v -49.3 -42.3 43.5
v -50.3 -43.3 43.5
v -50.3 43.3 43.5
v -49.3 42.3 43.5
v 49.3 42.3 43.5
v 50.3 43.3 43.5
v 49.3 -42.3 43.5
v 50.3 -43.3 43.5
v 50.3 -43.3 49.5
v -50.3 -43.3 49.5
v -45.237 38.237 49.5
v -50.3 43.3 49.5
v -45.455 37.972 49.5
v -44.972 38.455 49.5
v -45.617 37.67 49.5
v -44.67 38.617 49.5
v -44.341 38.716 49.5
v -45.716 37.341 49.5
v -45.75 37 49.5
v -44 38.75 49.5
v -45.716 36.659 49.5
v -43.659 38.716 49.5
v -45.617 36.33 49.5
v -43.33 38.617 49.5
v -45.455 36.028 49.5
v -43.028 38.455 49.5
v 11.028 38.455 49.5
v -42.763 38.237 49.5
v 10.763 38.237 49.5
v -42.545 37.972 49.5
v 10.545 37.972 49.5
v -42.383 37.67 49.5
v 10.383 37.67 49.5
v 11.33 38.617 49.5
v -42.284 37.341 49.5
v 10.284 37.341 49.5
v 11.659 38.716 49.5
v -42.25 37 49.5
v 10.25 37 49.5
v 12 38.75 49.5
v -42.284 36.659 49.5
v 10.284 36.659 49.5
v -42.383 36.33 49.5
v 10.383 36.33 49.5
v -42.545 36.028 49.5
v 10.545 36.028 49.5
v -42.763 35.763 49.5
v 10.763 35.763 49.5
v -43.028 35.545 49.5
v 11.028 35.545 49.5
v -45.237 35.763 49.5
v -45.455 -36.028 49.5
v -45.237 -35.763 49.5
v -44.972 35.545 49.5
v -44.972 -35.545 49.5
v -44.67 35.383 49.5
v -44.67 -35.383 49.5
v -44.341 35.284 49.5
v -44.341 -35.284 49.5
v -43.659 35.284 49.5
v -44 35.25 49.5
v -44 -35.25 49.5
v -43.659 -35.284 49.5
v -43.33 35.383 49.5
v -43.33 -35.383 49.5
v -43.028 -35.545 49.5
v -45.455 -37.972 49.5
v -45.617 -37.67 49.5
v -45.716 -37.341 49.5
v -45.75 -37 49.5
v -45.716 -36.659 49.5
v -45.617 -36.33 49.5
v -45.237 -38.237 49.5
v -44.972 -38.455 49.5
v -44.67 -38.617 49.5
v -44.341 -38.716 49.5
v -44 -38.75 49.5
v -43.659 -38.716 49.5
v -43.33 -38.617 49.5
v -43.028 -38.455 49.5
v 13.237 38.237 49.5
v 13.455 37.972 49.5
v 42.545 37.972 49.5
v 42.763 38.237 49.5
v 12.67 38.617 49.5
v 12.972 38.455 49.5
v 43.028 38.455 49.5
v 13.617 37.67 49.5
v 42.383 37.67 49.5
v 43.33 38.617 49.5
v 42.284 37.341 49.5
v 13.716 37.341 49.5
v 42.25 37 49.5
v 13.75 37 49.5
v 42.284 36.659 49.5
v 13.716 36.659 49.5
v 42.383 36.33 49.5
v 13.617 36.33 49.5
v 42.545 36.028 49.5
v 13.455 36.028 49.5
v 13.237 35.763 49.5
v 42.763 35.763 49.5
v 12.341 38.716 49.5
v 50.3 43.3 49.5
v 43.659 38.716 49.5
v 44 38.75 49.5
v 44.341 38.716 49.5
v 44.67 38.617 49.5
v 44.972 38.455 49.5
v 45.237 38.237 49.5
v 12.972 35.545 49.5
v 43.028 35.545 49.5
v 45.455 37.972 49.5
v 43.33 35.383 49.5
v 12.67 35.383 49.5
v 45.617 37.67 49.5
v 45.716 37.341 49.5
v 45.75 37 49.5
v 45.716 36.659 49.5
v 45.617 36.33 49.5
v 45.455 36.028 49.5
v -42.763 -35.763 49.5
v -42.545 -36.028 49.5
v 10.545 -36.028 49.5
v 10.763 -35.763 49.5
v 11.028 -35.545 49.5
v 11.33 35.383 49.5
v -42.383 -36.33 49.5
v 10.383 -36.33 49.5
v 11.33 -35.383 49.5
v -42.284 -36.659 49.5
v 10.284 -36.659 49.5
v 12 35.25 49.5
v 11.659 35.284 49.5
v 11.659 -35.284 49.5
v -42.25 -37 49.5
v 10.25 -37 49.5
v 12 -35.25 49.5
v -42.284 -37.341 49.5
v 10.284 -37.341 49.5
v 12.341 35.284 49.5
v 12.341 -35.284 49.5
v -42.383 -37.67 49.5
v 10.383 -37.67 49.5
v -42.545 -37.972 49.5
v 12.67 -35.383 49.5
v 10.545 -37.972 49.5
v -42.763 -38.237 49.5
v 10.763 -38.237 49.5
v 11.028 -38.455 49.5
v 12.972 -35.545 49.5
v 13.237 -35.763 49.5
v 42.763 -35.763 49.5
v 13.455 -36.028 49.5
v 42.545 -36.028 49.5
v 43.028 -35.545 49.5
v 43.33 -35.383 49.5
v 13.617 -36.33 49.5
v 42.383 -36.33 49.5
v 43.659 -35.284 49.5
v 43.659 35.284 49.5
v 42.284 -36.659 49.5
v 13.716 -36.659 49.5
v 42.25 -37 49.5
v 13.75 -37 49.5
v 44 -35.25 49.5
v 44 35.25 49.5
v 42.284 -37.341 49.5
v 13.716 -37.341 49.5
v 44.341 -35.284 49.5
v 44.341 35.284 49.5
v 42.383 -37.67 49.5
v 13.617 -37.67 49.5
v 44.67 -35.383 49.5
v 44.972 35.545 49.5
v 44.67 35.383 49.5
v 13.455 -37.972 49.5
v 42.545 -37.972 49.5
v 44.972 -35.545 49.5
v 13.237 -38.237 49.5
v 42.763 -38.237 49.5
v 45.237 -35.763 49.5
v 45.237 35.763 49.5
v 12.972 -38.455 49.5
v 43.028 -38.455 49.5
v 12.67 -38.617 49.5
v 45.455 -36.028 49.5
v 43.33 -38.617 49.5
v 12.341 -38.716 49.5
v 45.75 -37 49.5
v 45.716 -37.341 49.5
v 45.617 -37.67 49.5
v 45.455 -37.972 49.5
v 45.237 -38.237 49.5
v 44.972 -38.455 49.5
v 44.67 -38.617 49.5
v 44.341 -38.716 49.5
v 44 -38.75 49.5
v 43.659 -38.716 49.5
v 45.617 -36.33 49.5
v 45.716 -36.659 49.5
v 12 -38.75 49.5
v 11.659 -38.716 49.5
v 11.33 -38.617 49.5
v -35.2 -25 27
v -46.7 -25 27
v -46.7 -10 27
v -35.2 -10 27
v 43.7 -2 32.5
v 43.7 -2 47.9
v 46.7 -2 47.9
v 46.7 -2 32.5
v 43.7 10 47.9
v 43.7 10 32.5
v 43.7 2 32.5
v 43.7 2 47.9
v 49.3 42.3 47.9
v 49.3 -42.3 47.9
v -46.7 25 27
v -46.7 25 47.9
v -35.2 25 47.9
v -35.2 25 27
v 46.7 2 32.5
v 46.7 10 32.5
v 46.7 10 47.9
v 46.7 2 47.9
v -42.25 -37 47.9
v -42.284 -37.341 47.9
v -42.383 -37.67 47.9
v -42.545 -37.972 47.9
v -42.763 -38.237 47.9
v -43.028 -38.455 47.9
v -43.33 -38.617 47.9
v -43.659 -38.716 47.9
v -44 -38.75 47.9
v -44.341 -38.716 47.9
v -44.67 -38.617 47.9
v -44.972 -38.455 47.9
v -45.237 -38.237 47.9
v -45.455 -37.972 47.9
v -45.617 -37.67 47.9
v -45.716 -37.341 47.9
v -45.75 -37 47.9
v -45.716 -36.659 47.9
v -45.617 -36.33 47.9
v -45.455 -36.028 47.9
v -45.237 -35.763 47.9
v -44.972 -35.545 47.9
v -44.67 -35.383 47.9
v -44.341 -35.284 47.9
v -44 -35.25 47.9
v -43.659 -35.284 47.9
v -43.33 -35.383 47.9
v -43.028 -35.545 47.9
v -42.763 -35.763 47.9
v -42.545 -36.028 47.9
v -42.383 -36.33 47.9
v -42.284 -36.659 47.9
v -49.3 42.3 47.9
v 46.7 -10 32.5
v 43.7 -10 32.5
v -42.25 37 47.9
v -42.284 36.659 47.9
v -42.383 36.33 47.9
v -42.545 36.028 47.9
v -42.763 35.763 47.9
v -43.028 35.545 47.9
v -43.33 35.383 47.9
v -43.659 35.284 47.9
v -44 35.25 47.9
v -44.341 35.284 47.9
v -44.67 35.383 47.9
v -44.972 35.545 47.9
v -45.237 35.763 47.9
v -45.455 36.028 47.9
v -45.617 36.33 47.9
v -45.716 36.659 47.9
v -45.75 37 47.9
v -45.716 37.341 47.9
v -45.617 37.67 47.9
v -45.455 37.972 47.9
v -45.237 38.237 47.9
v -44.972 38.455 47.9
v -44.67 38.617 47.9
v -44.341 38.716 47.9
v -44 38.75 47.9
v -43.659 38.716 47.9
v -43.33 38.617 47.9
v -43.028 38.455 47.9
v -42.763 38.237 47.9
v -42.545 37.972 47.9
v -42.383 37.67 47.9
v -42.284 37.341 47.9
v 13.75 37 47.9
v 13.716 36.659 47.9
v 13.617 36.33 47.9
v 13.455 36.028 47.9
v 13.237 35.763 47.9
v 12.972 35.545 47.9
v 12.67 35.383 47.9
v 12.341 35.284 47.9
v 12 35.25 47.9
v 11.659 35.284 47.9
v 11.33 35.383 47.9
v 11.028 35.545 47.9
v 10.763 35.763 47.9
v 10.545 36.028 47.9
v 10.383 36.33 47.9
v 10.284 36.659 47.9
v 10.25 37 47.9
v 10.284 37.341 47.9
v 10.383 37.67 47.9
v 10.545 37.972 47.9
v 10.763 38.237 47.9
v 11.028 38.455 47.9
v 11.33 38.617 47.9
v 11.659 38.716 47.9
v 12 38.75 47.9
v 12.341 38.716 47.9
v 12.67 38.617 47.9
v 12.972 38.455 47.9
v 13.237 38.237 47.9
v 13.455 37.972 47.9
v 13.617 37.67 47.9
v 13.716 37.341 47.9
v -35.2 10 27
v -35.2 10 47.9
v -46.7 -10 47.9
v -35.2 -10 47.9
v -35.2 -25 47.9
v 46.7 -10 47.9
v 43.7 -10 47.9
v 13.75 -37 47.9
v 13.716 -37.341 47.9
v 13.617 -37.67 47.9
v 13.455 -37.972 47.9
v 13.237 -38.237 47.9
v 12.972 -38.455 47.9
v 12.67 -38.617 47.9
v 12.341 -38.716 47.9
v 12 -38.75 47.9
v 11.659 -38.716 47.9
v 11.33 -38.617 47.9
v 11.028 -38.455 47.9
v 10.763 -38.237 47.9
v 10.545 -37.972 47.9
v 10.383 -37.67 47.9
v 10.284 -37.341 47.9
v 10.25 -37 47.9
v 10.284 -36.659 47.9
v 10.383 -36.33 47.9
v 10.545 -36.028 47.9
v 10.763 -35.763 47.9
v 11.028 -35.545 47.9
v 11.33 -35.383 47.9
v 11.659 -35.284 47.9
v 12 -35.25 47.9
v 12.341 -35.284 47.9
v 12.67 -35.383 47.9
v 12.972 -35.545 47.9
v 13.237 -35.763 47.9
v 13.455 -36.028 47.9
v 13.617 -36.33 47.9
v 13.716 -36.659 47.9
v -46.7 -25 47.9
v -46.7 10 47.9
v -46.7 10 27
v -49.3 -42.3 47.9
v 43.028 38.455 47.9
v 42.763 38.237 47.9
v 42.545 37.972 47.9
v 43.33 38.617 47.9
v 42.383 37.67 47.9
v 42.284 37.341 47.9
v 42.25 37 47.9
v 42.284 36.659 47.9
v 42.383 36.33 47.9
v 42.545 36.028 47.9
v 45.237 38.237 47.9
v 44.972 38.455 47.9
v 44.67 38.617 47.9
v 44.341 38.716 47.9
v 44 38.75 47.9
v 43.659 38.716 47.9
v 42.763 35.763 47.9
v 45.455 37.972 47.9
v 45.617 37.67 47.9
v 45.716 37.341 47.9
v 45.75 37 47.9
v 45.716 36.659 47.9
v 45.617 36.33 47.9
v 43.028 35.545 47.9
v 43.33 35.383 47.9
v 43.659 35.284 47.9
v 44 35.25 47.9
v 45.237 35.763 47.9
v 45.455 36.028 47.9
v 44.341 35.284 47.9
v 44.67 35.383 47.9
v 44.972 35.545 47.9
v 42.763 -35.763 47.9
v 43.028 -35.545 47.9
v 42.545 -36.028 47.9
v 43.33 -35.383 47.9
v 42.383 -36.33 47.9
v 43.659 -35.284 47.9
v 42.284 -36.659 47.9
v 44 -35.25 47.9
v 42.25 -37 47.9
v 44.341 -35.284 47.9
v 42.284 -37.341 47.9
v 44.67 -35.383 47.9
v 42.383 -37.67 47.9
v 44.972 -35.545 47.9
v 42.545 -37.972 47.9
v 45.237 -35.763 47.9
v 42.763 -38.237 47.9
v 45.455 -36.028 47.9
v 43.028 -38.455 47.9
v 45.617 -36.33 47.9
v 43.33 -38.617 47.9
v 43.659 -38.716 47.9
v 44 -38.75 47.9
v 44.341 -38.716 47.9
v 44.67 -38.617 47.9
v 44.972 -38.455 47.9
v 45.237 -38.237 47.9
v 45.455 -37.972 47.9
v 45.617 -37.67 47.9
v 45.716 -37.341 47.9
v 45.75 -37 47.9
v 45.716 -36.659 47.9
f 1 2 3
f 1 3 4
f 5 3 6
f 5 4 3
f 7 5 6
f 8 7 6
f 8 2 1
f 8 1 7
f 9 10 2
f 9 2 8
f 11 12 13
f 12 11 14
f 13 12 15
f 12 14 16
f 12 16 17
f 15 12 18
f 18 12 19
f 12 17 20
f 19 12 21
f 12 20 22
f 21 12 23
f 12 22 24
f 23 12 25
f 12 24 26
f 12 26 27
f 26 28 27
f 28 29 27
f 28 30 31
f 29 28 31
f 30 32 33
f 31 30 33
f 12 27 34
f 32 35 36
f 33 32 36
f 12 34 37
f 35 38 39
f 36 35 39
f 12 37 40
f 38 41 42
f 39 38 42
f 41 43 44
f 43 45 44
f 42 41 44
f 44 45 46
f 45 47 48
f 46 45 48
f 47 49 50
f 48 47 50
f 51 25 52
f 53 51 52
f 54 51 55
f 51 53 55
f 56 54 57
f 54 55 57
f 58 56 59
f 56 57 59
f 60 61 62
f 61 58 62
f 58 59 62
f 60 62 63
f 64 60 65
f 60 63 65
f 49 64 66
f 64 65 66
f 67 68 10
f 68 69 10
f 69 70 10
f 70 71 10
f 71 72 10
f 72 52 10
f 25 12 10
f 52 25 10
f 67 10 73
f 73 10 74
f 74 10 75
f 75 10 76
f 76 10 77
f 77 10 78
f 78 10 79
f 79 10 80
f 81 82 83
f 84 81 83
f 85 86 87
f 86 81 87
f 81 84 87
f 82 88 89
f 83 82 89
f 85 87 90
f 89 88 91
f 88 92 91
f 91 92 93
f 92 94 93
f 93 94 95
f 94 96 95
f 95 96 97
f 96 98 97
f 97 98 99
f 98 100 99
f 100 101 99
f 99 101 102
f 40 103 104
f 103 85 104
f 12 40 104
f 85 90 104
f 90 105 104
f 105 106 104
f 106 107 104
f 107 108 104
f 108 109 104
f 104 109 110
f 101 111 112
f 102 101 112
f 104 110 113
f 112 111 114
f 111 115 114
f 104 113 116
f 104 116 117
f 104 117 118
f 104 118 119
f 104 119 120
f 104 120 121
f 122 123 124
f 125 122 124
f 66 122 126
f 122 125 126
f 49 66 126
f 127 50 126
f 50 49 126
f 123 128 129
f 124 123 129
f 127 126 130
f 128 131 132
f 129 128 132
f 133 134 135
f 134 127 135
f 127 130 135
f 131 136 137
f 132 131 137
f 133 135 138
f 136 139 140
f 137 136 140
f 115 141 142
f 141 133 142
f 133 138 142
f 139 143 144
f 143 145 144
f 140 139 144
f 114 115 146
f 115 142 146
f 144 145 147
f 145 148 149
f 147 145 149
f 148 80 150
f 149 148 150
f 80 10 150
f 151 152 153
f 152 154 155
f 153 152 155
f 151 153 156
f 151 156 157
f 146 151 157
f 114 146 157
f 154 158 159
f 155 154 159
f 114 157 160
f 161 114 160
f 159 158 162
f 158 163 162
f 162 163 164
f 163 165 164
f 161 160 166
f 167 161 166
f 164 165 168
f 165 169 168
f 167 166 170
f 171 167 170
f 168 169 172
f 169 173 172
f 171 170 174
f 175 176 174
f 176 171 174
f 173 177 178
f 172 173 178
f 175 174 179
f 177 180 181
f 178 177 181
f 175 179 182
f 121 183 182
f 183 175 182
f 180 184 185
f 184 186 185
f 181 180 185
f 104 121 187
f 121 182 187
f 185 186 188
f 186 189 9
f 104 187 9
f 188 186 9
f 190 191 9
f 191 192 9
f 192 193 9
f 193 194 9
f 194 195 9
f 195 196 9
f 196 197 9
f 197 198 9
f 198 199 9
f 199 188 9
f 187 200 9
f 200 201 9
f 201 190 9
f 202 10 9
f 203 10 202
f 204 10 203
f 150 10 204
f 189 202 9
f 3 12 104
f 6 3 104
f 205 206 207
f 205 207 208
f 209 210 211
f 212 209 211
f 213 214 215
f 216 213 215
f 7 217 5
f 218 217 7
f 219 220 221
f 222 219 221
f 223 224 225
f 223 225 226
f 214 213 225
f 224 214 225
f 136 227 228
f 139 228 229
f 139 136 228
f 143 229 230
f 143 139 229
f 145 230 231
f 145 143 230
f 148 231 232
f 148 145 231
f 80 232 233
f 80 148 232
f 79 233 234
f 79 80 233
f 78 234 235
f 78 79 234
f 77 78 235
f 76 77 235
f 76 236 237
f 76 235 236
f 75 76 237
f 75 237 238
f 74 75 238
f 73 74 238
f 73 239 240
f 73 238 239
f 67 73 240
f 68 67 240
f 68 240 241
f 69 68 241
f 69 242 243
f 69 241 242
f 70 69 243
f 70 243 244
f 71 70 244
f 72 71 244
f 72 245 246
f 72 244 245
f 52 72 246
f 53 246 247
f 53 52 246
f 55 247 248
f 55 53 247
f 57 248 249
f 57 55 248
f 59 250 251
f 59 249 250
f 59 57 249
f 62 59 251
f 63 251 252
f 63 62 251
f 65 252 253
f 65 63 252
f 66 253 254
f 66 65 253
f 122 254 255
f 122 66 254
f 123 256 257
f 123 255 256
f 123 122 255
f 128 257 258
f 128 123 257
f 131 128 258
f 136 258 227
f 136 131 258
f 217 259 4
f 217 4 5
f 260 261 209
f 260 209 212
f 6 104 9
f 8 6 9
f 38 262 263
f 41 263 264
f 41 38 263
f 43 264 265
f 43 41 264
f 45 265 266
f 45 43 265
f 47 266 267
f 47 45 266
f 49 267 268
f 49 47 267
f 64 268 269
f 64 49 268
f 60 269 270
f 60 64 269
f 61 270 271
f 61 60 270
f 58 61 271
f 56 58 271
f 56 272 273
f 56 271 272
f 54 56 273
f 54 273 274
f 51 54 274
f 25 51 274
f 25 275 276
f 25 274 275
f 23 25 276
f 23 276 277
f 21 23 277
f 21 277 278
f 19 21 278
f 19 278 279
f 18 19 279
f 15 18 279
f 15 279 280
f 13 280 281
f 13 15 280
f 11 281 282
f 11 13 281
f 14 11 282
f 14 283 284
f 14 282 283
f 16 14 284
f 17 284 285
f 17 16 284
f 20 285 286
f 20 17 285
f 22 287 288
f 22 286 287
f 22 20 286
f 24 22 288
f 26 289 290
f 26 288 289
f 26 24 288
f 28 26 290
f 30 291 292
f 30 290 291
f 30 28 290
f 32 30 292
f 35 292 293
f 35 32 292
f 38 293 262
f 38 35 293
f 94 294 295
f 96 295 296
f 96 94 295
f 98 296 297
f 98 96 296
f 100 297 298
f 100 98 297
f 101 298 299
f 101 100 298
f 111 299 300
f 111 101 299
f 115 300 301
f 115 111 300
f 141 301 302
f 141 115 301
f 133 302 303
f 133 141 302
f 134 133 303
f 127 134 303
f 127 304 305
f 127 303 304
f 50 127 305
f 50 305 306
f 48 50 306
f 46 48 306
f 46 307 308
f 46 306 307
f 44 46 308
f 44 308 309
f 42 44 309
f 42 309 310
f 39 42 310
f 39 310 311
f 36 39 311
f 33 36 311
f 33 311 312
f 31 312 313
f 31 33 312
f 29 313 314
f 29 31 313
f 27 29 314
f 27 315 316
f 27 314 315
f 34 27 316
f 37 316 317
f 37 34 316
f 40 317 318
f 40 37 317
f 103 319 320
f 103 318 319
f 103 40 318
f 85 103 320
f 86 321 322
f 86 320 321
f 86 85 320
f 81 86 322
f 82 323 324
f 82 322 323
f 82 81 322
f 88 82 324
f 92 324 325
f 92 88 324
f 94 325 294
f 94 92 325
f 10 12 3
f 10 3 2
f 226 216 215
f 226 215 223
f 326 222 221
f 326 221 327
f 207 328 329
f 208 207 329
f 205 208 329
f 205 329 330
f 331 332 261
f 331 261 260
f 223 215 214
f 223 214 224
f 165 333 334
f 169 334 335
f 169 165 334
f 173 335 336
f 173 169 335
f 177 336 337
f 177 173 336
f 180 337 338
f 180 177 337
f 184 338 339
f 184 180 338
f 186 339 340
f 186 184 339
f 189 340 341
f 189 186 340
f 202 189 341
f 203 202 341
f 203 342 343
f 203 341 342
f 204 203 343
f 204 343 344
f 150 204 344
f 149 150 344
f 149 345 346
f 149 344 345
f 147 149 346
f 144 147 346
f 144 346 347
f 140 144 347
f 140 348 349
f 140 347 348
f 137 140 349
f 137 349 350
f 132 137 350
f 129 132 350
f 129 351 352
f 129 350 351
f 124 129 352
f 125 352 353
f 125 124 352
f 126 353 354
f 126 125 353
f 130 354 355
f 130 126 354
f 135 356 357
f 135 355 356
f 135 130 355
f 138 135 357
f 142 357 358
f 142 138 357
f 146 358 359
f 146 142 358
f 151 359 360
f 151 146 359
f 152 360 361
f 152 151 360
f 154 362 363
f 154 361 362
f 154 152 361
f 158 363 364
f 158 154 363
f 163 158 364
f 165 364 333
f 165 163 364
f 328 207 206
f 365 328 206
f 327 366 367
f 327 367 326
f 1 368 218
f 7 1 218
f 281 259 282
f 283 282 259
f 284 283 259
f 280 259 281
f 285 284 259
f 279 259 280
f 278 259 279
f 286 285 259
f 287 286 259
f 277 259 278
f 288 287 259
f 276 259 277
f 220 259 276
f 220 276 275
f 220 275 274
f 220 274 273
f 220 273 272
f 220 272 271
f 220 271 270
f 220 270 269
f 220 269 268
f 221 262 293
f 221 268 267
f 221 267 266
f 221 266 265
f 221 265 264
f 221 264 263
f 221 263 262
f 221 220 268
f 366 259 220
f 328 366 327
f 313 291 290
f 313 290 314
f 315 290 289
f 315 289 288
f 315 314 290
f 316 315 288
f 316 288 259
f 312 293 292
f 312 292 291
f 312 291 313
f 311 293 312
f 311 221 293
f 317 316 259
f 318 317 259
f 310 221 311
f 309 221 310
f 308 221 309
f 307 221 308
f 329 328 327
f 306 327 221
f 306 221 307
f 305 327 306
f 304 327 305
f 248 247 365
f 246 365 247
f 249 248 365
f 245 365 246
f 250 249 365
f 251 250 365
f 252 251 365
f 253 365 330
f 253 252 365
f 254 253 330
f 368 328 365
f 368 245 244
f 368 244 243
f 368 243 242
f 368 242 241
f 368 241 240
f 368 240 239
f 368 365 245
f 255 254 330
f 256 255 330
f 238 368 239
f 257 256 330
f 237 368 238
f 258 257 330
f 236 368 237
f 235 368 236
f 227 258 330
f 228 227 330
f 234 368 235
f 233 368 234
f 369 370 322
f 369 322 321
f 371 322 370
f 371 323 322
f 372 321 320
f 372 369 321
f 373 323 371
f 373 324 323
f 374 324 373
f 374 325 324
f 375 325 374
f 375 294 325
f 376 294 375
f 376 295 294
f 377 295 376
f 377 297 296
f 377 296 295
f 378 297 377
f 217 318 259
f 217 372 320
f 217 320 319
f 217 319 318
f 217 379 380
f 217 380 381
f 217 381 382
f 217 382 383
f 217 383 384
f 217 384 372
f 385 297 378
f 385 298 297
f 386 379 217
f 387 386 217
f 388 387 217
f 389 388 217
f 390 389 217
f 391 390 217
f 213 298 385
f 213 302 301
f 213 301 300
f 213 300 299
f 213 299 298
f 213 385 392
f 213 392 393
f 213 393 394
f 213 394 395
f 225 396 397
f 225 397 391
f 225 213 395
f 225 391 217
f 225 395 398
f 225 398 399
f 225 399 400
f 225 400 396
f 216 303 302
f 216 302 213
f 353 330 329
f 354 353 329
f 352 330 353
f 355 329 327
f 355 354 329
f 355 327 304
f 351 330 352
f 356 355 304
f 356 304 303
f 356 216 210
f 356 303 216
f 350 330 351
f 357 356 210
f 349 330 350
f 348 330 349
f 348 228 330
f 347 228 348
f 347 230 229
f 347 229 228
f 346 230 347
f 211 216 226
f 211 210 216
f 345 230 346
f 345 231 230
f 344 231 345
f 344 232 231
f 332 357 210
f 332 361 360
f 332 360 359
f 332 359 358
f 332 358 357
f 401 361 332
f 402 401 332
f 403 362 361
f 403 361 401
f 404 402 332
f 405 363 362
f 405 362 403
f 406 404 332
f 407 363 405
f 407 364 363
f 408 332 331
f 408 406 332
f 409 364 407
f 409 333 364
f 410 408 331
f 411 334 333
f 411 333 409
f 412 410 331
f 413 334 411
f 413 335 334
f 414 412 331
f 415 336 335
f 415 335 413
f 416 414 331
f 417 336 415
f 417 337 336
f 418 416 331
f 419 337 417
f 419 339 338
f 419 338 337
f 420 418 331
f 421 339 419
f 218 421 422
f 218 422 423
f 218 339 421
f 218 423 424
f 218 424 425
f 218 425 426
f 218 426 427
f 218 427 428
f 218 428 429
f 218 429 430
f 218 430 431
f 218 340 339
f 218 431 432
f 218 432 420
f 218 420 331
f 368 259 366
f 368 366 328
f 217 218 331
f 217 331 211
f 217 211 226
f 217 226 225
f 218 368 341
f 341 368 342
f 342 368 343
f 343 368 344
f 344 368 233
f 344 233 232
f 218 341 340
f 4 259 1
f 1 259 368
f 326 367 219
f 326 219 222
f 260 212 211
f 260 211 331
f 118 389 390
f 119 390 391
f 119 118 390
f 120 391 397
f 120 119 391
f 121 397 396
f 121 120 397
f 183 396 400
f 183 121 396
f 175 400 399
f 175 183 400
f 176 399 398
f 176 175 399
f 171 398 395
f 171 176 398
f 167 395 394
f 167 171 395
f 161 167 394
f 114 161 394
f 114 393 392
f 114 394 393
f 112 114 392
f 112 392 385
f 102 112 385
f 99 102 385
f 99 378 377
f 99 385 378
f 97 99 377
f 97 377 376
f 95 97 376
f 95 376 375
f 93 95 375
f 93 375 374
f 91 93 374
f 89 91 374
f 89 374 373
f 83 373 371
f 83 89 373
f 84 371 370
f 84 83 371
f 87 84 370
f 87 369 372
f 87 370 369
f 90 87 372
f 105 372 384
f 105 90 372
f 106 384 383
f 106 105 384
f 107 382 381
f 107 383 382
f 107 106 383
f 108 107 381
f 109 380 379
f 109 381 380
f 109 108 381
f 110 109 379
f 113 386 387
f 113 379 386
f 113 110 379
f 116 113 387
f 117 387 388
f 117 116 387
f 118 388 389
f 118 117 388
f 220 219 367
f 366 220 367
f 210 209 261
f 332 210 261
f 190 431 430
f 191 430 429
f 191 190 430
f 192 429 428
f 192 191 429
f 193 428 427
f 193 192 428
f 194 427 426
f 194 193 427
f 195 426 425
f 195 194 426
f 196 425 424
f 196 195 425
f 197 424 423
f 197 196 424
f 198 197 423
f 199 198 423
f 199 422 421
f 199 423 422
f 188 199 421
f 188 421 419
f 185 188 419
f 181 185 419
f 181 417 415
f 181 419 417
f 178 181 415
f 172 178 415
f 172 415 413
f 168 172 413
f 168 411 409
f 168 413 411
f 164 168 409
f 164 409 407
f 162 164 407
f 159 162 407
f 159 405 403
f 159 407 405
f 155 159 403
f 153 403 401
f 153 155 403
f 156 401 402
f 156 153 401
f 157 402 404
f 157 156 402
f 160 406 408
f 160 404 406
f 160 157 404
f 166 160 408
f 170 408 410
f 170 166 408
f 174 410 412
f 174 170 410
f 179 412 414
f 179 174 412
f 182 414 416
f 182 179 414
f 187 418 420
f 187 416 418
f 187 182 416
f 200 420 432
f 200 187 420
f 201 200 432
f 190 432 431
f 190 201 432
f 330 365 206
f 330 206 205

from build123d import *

# Parameters (mm, degrees)
SKETCH031_W             = 98.6
SKETCH031_H             = 84.6
PAD021_DEPTH            = 1.6
SKETCH032_W             = 100.6
SKETCH032_H             = 86.6
SKETCH032_W_2           = 98.6
SKETCH032_H_2           = 84.6
PAD022_DEPTH            = 6
SKETCH034_W             = 11.5
SKETCH034_H             = 15
PAD023_DEPTH            = 22.5
SKETCH035_W             = 3
SKETCH035_H             = 8
PAD024_DEPTH            = 17
SKETCH033_R             = 1.75
POCKET010_DEPTH         = 5
BODY007_PLACEMENT_ANGLE = 180


with BuildPart() as part:
    # Sketch031 → Pad021 (new body)
    with BuildSketch(Plane.XY):
        Rectangle(SKETCH031_W, SKETCH031_H)
    extrude(amount=PAD021_DEPTH)

    # Sketch032 → Pad022 (join)
    with BuildSketch(Plane.XY):
        Rectangle(SKETCH032_W, SKETCH032_H)
        Rectangle(SKETCH032_W_2, SKETCH032_H_2, mode=Mode.SUBTRACT)
    extrude(amount=PAD022_DEPTH)

    # Sketch034 → Pad023 (join)
    with BuildSketch(Plane.XY):
        with Locations((-40.95, 17.5)):
            Rectangle(SKETCH034_W, SKETCH034_H)
        with Locations((-40.95, -17.5)):
            Rectangle(SKETCH034_W, SKETCH034_H)
    extrude(amount=PAD023_DEPTH)

    # Sketch035 → Pad024 (join)
    with BuildSketch(Plane.XY):
        with Locations((45.2, 6)):
            Rectangle(SKETCH035_W, SKETCH035_H)
        with Locations((45.2, -6)):
            Rectangle(SKETCH035_W, SKETCH035_H)
    extrude(amount=PAD024_DEPTH)

    # Sketch033 → Pocket010 (cut)
    with BuildSketch(Plane.XY):
        with Locations((-44, 37)):
            Circle(SKETCH033_R)
        with Locations((12, 37)):
            Circle(SKETCH033_R)
        with Locations((44, 37)):
            Circle(SKETCH033_R)
        with Locations((44, -37)):
            Circle(SKETCH033_R)
        with Locations((12, -37)):
            Circle(SKETCH033_R)
        with Locations((-44, -37)):
            Circle(SKETCH033_R)
    extrude(amount=POCKET010_DEPTH, mode=Mode.SUBTRACT)


with BuildPart() as part_1:
    # Body007 placement: moved
    add(part.part.moved(Location((0, 0, 49.5))).rotate(Axis((0, 0, 49.5), (1, 0, 0)), BODY007_PLACEMENT_ANGLE))


solid = part_1.part
